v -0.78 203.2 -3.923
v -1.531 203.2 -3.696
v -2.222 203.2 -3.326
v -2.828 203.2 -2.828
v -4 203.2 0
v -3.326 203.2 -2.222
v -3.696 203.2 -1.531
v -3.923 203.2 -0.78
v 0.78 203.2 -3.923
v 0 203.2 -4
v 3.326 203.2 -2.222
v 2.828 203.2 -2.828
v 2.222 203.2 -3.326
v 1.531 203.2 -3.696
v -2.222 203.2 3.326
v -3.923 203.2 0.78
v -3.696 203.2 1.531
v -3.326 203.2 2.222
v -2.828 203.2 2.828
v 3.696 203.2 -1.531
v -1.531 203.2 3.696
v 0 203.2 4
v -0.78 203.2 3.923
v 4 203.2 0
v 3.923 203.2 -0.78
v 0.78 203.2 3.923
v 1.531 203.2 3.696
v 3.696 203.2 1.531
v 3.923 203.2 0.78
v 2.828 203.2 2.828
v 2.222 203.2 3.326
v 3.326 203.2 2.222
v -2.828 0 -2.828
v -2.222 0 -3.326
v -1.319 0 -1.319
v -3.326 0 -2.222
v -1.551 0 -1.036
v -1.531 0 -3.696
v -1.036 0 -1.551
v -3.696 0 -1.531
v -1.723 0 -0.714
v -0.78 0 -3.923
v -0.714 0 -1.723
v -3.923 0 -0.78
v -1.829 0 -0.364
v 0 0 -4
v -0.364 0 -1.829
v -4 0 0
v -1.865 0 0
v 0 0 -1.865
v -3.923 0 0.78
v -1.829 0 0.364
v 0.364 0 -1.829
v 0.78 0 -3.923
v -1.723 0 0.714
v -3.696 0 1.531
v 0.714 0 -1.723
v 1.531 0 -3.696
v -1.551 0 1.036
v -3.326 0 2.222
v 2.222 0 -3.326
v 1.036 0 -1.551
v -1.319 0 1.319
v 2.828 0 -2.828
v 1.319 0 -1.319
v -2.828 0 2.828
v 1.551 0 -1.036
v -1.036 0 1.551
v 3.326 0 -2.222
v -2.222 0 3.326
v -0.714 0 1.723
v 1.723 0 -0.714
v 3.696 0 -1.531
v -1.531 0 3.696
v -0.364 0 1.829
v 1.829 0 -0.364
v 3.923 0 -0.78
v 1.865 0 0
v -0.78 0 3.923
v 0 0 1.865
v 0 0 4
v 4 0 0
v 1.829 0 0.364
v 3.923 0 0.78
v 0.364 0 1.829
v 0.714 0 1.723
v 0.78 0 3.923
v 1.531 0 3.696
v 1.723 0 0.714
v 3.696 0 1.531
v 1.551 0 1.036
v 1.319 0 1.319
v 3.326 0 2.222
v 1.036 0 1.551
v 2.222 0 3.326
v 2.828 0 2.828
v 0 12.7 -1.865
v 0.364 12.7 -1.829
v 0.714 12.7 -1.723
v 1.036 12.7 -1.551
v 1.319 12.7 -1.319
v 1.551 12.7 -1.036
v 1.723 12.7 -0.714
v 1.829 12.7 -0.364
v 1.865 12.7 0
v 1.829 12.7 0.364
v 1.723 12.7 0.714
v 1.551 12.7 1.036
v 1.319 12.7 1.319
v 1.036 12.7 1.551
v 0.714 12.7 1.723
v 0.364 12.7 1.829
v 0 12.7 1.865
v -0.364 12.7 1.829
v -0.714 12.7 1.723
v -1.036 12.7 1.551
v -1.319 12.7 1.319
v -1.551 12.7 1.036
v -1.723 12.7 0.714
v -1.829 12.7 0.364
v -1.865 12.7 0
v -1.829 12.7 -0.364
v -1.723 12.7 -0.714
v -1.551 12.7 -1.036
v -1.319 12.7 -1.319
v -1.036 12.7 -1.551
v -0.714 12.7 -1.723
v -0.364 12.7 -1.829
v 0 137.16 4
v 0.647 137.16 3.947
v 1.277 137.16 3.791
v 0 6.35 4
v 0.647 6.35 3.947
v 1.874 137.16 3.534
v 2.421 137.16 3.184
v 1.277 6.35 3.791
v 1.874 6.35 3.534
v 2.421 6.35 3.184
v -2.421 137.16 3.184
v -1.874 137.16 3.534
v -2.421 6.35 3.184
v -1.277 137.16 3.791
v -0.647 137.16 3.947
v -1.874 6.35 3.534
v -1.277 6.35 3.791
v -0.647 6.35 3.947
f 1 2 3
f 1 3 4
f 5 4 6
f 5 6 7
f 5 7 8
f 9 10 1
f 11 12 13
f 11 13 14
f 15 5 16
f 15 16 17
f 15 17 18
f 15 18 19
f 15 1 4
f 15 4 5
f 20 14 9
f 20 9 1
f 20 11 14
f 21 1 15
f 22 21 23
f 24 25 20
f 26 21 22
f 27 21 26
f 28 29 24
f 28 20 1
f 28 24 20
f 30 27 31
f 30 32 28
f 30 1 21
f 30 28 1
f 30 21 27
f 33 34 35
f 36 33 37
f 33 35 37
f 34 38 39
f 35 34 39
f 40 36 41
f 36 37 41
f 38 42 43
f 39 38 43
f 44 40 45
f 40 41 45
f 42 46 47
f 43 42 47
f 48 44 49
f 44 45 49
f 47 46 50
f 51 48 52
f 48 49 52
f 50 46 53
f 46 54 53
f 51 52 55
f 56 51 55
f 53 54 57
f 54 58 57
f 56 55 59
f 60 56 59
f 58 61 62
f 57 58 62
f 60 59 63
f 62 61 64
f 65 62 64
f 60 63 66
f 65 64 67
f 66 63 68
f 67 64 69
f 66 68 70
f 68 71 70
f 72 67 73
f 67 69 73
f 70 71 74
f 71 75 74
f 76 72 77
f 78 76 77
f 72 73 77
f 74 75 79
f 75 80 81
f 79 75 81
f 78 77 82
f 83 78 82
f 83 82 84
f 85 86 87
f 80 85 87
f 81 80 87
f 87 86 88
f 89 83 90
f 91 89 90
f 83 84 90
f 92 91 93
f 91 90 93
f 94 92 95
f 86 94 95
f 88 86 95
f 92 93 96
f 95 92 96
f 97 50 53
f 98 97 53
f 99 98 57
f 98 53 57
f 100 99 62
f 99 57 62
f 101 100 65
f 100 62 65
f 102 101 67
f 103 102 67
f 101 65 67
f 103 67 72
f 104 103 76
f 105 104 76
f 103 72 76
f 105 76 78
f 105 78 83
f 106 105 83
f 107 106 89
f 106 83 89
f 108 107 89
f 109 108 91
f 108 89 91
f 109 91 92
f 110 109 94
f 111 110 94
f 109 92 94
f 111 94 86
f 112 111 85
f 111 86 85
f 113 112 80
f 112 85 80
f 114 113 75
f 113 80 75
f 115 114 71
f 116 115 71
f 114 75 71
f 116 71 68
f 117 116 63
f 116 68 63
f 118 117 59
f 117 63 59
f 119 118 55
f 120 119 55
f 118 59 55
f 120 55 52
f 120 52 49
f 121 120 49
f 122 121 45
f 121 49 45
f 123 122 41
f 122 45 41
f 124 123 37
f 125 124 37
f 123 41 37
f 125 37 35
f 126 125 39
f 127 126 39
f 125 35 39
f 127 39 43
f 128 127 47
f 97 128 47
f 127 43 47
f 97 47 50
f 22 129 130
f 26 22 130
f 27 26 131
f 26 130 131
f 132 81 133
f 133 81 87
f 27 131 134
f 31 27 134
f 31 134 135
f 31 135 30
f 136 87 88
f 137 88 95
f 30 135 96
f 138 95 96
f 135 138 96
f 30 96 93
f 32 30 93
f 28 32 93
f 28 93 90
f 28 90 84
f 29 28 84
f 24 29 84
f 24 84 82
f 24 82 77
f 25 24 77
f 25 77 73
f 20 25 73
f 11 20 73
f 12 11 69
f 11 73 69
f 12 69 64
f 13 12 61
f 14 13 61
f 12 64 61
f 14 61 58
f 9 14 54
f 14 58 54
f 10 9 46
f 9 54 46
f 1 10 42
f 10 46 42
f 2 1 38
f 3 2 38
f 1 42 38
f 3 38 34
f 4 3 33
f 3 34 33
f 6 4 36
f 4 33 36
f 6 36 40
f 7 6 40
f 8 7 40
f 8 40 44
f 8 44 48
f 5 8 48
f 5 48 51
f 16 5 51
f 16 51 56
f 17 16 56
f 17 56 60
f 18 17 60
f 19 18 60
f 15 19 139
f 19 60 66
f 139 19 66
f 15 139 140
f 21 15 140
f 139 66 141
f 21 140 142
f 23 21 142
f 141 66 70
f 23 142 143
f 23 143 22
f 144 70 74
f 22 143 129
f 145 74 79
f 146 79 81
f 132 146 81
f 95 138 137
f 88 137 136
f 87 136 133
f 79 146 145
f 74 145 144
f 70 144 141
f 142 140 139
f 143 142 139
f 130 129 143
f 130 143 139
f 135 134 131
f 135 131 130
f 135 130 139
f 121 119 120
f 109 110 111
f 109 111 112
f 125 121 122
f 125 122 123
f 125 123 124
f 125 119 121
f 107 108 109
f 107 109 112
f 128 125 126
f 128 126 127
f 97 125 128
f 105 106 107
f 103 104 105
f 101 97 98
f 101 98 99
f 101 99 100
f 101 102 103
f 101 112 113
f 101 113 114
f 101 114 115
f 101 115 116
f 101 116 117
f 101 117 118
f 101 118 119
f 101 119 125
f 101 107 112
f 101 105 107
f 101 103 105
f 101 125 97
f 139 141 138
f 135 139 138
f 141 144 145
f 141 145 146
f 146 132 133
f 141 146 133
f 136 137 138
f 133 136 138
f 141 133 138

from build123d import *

# Parameters (mm, degrees)
SKETCH1_R           = 4
BOSS_EXTRUDE1_DEPTH = 203.2
SKETCH2_R           = 1.864950538
CUT_EXTRUDE1_DEPTH  = 12.7
CUT_EXTRUDE2_START  = -6.35
CUT_EXTRUDE2_DEPTH  = 130.81


with BuildPart() as part:
    # Sketch1 → Boss-Extrude1 (new body)
    with BuildSketch(Plane(origin=(0, 0, 0), x_dir=(1, 0, 0), z_dir=(0, 1, 0))):
        with Locations(Location((0, 0, 0), (0, 0, 270))):
            Circle(SKETCH1_R)
    extrude(amount=BOSS_EXTRUDE1_DEPTH)

    # Sketch2 → Cut-Extrude1 (cut)
    with BuildSketch(Plane.XZ):
        with Locations(Location((0, 0, 0), (0, 0, 270))):
            Circle(SKETCH2_R)
    extrude(amount=-CUT_EXTRUDE1_DEPTH, mode=Mode.SUBTRACT)

    # Sketch4 → Cut-Extrude2 (cut)
    with BuildSketch(Plane.XZ.offset(CUT_EXTRUDE2_START)):
        Polygon((-31.691808684, 3.184149537), (-2.420989824, 3.184149537), (2.420989824, 3.184149537), (31.691808684, 3.184149537), (31.691808684, 61.725787257), (-31.691808684, 61.725787257), align=None)
    extrude(amount=-CUT_EXTRUDE2_DEPTH, mode=Mode.SUBTRACT)


solid = part.part
